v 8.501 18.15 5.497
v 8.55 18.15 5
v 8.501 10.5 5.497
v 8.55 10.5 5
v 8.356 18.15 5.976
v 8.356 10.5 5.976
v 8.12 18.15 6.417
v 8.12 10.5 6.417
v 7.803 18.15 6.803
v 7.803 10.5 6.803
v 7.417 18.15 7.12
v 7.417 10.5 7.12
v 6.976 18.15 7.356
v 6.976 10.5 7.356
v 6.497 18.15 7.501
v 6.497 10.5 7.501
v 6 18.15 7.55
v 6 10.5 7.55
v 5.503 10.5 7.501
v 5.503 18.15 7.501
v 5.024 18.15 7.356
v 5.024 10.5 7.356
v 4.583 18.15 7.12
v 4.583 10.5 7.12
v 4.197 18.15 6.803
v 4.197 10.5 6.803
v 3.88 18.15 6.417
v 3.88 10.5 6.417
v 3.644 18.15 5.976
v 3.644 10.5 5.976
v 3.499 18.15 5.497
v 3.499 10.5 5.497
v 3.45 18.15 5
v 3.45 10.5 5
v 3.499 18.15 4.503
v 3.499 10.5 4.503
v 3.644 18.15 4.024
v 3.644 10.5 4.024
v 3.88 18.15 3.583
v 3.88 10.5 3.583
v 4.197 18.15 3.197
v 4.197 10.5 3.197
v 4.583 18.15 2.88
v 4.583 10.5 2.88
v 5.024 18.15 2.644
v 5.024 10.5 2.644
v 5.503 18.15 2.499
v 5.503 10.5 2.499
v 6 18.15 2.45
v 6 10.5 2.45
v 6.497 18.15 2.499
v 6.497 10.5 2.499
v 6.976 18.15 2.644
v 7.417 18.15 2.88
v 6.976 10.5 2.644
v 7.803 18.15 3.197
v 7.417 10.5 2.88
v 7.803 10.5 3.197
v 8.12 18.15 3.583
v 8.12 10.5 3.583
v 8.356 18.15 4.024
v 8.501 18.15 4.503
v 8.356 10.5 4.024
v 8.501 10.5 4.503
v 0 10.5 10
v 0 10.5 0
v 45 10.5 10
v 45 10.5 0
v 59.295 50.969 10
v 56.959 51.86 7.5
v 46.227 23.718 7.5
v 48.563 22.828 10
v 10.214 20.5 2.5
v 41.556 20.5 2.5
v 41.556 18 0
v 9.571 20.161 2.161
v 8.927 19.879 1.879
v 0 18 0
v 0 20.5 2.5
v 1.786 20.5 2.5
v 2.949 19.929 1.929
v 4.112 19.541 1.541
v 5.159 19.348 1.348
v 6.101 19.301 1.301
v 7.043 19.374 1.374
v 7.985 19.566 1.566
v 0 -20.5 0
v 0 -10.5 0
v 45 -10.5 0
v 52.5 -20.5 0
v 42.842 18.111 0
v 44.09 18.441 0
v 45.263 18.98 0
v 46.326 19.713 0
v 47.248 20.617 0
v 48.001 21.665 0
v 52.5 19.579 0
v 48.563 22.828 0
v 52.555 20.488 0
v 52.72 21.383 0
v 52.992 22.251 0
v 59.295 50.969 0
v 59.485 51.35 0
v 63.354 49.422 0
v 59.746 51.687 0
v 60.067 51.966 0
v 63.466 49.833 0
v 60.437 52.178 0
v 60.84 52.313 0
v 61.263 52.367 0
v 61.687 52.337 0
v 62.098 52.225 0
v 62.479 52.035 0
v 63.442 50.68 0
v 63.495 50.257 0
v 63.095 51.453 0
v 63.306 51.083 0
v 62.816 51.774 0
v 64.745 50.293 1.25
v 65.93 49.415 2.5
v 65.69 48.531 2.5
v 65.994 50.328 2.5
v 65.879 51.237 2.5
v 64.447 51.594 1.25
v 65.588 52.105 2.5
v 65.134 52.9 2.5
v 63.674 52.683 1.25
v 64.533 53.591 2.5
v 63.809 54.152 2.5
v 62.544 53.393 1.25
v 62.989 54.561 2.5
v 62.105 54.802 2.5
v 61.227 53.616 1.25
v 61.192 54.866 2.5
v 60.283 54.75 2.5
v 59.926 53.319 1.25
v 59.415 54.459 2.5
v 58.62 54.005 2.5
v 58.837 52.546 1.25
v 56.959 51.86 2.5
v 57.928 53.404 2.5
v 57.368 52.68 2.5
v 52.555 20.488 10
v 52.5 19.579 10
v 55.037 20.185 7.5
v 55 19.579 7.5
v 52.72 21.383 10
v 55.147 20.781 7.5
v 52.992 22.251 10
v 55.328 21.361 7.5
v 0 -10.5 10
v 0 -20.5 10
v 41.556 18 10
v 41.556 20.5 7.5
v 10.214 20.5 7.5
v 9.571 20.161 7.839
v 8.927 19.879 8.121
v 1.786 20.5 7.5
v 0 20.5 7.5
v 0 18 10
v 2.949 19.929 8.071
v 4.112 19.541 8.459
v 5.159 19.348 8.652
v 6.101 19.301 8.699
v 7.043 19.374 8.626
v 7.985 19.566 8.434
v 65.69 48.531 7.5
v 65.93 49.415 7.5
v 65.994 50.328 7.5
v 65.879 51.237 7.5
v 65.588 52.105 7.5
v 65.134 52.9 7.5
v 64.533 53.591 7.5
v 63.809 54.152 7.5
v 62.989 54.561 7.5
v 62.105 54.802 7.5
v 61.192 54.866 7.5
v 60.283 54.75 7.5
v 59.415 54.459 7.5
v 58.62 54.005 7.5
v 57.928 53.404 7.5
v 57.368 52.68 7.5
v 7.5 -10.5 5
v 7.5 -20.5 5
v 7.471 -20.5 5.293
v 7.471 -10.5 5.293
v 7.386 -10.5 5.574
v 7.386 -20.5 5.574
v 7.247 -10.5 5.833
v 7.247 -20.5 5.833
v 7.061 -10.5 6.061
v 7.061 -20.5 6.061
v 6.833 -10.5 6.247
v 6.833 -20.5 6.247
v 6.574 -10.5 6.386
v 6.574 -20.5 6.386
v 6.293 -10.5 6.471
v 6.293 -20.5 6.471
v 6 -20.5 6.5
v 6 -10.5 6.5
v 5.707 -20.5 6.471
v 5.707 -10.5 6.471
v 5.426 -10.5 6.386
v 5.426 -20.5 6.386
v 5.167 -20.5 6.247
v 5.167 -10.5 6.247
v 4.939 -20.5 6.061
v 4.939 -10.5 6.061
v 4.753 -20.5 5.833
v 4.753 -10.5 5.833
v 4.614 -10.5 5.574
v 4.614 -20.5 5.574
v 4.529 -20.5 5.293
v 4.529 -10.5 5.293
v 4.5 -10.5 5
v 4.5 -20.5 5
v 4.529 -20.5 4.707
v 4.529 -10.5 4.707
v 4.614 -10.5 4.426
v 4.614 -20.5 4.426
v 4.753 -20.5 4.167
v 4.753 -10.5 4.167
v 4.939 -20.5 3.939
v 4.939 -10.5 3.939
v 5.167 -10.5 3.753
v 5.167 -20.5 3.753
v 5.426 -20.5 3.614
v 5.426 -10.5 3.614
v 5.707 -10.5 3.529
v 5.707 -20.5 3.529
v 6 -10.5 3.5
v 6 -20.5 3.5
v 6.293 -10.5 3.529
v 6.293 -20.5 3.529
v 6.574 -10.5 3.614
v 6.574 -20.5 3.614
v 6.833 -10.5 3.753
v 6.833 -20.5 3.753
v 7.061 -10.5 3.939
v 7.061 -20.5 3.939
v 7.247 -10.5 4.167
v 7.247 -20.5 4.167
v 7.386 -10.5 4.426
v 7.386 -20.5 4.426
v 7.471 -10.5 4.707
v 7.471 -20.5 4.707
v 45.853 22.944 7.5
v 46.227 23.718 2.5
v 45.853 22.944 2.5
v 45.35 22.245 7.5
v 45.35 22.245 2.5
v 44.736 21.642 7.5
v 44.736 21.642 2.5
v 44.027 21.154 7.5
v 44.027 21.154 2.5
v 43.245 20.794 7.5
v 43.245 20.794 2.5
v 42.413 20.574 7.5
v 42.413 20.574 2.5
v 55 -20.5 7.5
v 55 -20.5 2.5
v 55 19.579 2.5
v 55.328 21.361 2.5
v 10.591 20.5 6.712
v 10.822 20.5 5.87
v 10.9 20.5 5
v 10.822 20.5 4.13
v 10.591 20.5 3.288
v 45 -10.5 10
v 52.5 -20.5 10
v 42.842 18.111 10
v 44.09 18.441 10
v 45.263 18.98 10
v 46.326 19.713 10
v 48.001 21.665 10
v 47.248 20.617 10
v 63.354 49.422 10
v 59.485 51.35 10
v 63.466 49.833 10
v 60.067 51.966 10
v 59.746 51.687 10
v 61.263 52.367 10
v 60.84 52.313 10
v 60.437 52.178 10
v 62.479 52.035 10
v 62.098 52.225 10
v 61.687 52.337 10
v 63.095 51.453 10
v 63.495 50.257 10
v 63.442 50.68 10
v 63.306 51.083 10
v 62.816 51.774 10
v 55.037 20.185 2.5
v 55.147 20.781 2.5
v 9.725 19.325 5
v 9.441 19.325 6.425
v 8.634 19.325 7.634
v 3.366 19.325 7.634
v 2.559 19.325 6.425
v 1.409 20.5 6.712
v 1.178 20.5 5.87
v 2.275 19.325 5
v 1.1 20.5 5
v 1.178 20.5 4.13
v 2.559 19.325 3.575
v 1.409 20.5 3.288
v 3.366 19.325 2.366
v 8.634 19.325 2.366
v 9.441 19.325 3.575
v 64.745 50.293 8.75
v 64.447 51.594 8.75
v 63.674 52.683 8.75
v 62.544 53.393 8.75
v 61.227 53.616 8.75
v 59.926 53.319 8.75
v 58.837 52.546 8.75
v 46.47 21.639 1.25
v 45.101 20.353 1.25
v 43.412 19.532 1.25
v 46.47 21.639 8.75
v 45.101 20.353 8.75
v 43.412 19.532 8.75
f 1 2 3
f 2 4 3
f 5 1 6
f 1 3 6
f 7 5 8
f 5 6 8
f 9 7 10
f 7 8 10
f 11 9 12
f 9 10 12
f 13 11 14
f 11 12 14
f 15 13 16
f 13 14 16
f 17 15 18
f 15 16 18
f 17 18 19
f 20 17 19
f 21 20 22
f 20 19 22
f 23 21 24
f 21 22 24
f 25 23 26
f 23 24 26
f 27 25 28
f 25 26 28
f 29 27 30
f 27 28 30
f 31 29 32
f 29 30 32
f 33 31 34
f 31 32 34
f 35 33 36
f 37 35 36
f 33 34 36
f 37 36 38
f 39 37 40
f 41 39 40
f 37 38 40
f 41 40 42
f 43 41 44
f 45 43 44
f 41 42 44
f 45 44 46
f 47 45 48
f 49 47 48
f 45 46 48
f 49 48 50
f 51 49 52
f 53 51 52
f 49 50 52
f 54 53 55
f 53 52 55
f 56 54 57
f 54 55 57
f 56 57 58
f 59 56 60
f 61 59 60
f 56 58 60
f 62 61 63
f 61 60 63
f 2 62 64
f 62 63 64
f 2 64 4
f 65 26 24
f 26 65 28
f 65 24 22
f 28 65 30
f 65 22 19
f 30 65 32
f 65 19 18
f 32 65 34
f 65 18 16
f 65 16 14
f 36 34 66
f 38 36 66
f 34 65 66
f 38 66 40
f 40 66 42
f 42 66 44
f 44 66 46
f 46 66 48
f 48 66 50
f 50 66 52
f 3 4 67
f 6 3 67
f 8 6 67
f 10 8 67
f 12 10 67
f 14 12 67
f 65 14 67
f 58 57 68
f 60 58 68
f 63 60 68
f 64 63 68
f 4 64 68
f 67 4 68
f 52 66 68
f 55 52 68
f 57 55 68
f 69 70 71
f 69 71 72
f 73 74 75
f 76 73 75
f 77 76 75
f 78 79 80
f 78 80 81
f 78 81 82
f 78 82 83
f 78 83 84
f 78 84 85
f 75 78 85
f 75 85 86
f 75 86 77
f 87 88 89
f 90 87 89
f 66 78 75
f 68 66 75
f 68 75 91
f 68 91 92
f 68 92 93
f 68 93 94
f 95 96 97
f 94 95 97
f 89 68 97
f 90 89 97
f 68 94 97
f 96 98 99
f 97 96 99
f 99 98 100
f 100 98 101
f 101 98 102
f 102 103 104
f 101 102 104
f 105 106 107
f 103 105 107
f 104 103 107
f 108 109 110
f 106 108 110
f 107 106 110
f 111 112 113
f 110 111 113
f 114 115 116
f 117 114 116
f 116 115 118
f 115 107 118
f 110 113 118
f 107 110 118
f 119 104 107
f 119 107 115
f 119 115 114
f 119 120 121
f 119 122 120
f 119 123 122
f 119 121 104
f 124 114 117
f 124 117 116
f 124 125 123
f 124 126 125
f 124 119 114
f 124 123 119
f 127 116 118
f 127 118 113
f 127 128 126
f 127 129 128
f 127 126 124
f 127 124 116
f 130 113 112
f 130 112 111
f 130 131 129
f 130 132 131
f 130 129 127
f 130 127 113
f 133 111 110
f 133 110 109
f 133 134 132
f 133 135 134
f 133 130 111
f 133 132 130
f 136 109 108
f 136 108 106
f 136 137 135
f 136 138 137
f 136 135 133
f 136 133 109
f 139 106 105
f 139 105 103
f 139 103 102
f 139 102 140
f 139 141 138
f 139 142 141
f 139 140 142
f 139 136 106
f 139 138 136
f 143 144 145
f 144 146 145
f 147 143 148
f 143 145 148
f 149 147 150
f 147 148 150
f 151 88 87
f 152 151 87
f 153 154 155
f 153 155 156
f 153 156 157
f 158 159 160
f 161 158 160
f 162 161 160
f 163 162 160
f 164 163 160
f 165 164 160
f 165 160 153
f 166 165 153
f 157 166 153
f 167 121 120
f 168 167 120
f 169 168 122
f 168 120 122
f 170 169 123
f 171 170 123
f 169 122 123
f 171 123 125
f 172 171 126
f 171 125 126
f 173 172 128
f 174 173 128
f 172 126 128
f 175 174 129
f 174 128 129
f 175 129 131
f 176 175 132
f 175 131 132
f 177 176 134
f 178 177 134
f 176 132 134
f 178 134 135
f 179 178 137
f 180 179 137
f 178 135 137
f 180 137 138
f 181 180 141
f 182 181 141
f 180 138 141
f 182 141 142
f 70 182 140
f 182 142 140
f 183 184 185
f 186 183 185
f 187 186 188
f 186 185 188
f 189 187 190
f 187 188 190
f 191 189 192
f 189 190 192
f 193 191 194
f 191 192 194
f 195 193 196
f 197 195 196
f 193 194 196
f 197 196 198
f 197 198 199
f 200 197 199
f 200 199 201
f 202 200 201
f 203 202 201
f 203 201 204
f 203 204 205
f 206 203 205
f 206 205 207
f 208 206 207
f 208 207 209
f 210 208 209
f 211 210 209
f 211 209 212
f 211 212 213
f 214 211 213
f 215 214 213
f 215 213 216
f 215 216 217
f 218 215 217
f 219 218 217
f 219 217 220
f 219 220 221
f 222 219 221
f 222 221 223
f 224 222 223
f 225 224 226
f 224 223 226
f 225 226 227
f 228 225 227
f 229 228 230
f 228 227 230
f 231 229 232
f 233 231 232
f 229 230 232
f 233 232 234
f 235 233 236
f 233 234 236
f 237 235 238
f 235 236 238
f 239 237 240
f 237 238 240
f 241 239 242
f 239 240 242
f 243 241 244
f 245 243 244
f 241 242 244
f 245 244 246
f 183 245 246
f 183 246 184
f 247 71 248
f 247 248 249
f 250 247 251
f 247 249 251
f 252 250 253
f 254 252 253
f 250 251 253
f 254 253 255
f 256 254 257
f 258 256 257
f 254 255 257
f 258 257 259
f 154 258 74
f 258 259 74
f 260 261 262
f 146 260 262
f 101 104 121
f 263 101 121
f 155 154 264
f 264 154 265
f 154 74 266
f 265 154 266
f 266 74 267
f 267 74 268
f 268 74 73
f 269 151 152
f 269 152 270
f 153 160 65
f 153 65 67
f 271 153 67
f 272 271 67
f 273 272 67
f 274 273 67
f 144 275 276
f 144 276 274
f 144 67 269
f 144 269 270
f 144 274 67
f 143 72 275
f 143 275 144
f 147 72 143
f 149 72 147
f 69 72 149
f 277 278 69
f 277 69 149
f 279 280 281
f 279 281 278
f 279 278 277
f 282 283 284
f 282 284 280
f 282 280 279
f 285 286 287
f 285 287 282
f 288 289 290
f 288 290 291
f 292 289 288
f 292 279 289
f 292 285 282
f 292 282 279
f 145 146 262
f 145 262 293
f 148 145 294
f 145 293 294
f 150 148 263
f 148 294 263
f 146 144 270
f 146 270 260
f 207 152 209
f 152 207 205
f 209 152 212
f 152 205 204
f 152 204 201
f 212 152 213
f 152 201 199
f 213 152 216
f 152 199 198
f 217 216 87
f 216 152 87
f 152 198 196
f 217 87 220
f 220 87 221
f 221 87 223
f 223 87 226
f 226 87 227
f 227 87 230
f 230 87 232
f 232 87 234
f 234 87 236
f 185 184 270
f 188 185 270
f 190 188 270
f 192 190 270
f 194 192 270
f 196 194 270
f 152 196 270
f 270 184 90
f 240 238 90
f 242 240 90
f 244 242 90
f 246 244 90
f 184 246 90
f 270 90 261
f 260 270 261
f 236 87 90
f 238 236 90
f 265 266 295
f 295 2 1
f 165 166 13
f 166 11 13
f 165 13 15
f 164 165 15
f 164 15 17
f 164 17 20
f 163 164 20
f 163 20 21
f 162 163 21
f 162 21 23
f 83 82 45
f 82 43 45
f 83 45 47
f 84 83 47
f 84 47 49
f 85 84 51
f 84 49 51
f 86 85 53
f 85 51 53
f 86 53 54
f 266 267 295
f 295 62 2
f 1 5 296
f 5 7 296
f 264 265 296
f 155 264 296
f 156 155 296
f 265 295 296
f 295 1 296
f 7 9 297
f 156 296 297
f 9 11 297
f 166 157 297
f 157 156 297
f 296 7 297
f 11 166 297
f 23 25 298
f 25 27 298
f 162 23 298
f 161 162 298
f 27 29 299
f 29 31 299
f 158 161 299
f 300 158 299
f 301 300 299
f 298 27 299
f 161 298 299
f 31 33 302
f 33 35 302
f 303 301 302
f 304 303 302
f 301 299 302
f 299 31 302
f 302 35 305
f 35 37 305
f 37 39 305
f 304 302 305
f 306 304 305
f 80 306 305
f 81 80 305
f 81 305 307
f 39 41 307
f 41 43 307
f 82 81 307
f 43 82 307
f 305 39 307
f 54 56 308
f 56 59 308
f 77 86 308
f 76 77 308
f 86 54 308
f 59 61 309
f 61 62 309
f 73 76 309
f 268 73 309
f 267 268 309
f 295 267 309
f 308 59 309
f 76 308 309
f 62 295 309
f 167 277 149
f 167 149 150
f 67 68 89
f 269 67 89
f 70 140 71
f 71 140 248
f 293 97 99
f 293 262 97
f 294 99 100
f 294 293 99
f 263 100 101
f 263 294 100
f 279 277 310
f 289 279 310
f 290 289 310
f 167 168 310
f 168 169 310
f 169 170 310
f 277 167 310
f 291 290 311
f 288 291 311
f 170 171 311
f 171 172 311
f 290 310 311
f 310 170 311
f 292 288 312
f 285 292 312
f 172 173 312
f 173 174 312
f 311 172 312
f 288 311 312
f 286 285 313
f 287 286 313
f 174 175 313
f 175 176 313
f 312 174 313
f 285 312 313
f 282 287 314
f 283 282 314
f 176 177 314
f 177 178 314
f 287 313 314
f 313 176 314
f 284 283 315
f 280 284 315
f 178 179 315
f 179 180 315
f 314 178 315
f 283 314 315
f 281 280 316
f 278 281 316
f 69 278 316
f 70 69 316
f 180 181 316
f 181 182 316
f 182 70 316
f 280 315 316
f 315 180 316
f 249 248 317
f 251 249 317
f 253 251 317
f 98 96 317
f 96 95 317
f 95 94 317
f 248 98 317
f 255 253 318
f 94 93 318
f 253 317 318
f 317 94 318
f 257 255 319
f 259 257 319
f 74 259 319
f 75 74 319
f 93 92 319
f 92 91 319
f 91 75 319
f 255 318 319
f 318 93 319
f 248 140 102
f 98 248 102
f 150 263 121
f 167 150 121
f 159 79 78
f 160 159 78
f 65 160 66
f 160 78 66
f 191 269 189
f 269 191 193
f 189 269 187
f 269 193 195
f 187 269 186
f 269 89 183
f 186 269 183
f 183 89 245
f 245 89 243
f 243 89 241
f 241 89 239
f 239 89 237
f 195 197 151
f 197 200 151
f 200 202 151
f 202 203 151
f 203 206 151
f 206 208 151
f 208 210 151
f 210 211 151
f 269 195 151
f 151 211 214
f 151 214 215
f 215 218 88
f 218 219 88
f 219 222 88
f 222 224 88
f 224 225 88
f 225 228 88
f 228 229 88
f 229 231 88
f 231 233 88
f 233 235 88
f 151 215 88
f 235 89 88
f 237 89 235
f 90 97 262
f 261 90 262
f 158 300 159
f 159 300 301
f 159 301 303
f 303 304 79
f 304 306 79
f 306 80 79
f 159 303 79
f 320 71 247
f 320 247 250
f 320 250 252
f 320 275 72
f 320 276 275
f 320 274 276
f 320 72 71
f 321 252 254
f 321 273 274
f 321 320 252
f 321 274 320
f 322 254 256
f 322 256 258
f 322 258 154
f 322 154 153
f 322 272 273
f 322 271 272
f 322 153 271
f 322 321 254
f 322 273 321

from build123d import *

# Parameters (mm, degrees)
F1_DEPTH       = 10
F3_D           = 5.1
F3_DEPTH       = 20
F3_CSINK_D     = 9.8
F3_CSINK_ANGLE = 90
F3_TIP         = 1.5321945785
F5_D           = 3
F6_T1_DEPTH    = 29.0789805985
F6_T3_DEPTH    = 30.1186834219
F6_T5_DEPTH    = 47.9847156333
F6_T7_DEPTH    = 46.5081880684
F6_T10_ANGLE   = 180
F6_T12_ANGLE   = 180
F6_T14_ANGLE   = 69.1257858818
F6_T16_ANGLE   = 20.8742141182
F6_T18_ANGLE   = 69.1257858818
F6_T20_ANGLE   = 20.8742141182


# Not quite as in the source:
# - a fillet or chamfer that OpenCascade refuses, or shapes differently, is made with other operations: its cross-section is extruded or revolved along the edge and cut away or added


with BuildPart() as f1:
    # F0 (on Top) → F1 (new body)
    with BuildSketch(Plane.XY):
        with BuildLine():
            Line((41.5555081634, 20.5), (0, 20.5))
            Line((0, 20.5), (0, 10.5))
            Line((0, 10.5), (45, 10.5))
            Line((45, 10.5), (45, -10.5))
            Line((45, -10.5), (0, -10.5))
            Line((0, -10.5), (0, -20.5))
            Line((0, -20.5), (45, -20.5))
            Line((45, -20.5), (55, -20.5))
            Line((55, -20.5), (55, 19.5789805985))
            ThreePointArc((55, 19.5789805985), (55.0827282347, 20.4847611382), (55.3281753544, 21.3605682278))
            Line((55.3281753544, 21.3605682278), (65.6895257755, 48.5309478737))
            ThreePointArc((65.6895257755, 48.5309478737), (62.9889896705, 54.5607899764), (56.9591475677, 51.8602538715))
            Line((56.9591475677, 51.8602538715), (46.227332809, 23.7184123708))
            ThreePointArc((46.227332809, 23.7184123708), (44.3920608118, 21.382480228), (41.5555081634, 20.5))
        make_face()
    extrude(amount=F1_DEPTH)

    # F3
    with Locations(Plane(origin=(0, 20.5, 0), x_dir=(-1, 0, 0), z_dir=(0, 1, 0))):
        with Locations((-6, 5)):
            CounterSinkHole(F3_D / 2, F3_CSINK_D / 2, depth=F3_DEPTH, counter_sink_angle=F3_CSINK_ANGLE)
            with Locations((0, 0, -(F3_DEPTH + F3_TIP / 2))):  # 118° drill point
                Cone(0, F3_D / 2, F3_TIP, mode=Mode.SUBTRACT)

    # F5 (through all)
    with Locations(Plane(origin=(0, -10.5, 0), x_dir=(-1, 0, 0), z_dir=(0, 1, 0))):
        with Locations((-6, 5)):
            Hole(F5_D / 2)

    # F6: chamfer of 2.5 on 4 edges, made by hand

    # F6_s2 → F6_t1 (cut)
    with BuildSketch(Plane(origin=(14.1361725075, 37.0690265418, 0), x_dir=(0, 0, 1), z_dir=(0.3563175258, 0.9343649291, 0))):
        Polygon((10, 41.5855618218), (7.5, 44.0855618218), (10, 44.0855618218), align=None)
        Polygon((0, 41.5855618218), (2.5, 44.0855618218), (0, 44.0855618218), align=None)
    extrude(amount=F6_T1_DEPTH, mode=Mode.SUBTRACT)

    # F6_s4 → F6_t3 (cut)
    with BuildSketch(Plane(origin=(24.4975229285, 64.2394061877, 0), x_dir=(0, 0, 1), z_dir=(-0.3563175258, -0.9343649291, 0))):
        Polygon((7.5, -34.7419125306), (10, -37.2419125306), (10, -34.7419125306), align=None)
        Polygon((2.5, -34.7419125306), (0, -37.2419125306), (0, -34.7419125306), align=None)
    extrude(amount=F6_T3_DEPTH, mode=Mode.SUBTRACT)

    # F6_s6 → F6_t5 (cut)
    with BuildSketch(Plane.YZ.offset(-6.4292074699)):
        Polygon((20.5, 7.5), (18, 10), (20.5, 10), align=None)
        Polygon((20.5, 2.5), (18, 0), (20.5, 0), align=None)
    extrude(amount=F6_T5_DEPTH, mode=Mode.SUBTRACT)

    # F6_s8 → F6_t7 (cut)
    with BuildSketch(Plane.XZ.offset(-19.5789805985)):
        Polygon((52.5, 10), (55, 7.5), (55, 10), align=None)
        Polygon((52.5, 0), (55, 2.5), (55, 0), align=None)
    extrude(amount=F6_T7_DEPTH, mode=Mode.SUBTRACT)

    # F6_s9 → F6_t10 (revolve, cut)
    with BuildSketch(Plane(origin=(24.4975229285, 64.2394061877, 0), x_dir=(0, 0, 1), z_dir=(-0.3563175258, -0.9343649291, 0))):
        Polygon((0, -41.5855618218), (2.5, -44.0855618218), (0, -44.0855618218), align=None)
    revolve(axis=Axis((61.3243366716, 50.1956008726, 0), (0, 0, 1)), revolution_arc=F6_T10_ANGLE, mode=Mode.SUBTRACT)

    # F6_s11 → F6_t12 (revolve, cut)
    with BuildSketch(Plane(origin=(24.4975229285, 64.2394061877, 0), x_dir=(0, 0, 1), z_dir=(-0.3563175258, -0.9343649291, 0))):
        Polygon((10, -41.5855618218), (7.5, -44.0855618218), (10, -44.0855618218), align=None)
    revolve(axis=Axis((61.3243366716, 50.1956008726, 10), (0, 0, 1)), revolution_arc=F6_T12_ANGLE, mode=Mode.SUBTRACT)

    # F6_s13 → F6_t14 (revolve, cut)
    with BuildSketch(Plane(origin=(13.7657081698, 36.0975646869, 0), x_dir=(0, 0, 1), z_dir=(0.3563175258, 0.9343649291, 0))):
        Polygon((7.5, 34.7419125306), (10, 37.2419125306), (10, 34.7419125306), align=None)
    revolve(axis=Axis((41.5555081634, 25.5, 10), (0, 0, -1)), revolution_arc=F6_T14_ANGLE, mode=Mode.SUBTRACT)

    # F6_s15 → F6_t16 (revolve, cut)
    with BuildSketch(Plane.XZ.offset(-19.5789805985)):
        Polygon((52.5, 10), (55, 7.5), (55, 10), align=None)
    revolve(axis=Axis((60, 19.5789805985, 10), (0, 0, -1)), revolution_arc=F6_T16_ANGLE, mode=Mode.SUBTRACT)

    # F6_s17 → F6_t18 (revolve, cut)
    with BuildSketch(Plane(origin=(13.7657081698, 36.0975646869, 0), x_dir=(0, 0, 1), z_dir=(0.3563175258, 0.9343649291, 0))):
        Polygon((2.5, 34.7419125306), (0, 37.2419125306), (0, 34.7419125306), align=None)
    revolve(axis=Axis((41.5555081634, 25.5, 0), (0, 0, -1)), revolution_arc=F6_T18_ANGLE, mode=Mode.SUBTRACT)

    # F6_s19 → F6_t20 (revolve, cut)
    with BuildSketch(Plane.XZ.offset(-19.5789805985)):
        Polygon((52.5, 0), (55, 2.5), (55, 0), align=None)
    revolve(axis=Axis((60, 19.5789805985, 0), (0, 0, -1)), revolution_arc=F6_T20_ANGLE, mode=Mode.SUBTRACT)


solid = f1.part
